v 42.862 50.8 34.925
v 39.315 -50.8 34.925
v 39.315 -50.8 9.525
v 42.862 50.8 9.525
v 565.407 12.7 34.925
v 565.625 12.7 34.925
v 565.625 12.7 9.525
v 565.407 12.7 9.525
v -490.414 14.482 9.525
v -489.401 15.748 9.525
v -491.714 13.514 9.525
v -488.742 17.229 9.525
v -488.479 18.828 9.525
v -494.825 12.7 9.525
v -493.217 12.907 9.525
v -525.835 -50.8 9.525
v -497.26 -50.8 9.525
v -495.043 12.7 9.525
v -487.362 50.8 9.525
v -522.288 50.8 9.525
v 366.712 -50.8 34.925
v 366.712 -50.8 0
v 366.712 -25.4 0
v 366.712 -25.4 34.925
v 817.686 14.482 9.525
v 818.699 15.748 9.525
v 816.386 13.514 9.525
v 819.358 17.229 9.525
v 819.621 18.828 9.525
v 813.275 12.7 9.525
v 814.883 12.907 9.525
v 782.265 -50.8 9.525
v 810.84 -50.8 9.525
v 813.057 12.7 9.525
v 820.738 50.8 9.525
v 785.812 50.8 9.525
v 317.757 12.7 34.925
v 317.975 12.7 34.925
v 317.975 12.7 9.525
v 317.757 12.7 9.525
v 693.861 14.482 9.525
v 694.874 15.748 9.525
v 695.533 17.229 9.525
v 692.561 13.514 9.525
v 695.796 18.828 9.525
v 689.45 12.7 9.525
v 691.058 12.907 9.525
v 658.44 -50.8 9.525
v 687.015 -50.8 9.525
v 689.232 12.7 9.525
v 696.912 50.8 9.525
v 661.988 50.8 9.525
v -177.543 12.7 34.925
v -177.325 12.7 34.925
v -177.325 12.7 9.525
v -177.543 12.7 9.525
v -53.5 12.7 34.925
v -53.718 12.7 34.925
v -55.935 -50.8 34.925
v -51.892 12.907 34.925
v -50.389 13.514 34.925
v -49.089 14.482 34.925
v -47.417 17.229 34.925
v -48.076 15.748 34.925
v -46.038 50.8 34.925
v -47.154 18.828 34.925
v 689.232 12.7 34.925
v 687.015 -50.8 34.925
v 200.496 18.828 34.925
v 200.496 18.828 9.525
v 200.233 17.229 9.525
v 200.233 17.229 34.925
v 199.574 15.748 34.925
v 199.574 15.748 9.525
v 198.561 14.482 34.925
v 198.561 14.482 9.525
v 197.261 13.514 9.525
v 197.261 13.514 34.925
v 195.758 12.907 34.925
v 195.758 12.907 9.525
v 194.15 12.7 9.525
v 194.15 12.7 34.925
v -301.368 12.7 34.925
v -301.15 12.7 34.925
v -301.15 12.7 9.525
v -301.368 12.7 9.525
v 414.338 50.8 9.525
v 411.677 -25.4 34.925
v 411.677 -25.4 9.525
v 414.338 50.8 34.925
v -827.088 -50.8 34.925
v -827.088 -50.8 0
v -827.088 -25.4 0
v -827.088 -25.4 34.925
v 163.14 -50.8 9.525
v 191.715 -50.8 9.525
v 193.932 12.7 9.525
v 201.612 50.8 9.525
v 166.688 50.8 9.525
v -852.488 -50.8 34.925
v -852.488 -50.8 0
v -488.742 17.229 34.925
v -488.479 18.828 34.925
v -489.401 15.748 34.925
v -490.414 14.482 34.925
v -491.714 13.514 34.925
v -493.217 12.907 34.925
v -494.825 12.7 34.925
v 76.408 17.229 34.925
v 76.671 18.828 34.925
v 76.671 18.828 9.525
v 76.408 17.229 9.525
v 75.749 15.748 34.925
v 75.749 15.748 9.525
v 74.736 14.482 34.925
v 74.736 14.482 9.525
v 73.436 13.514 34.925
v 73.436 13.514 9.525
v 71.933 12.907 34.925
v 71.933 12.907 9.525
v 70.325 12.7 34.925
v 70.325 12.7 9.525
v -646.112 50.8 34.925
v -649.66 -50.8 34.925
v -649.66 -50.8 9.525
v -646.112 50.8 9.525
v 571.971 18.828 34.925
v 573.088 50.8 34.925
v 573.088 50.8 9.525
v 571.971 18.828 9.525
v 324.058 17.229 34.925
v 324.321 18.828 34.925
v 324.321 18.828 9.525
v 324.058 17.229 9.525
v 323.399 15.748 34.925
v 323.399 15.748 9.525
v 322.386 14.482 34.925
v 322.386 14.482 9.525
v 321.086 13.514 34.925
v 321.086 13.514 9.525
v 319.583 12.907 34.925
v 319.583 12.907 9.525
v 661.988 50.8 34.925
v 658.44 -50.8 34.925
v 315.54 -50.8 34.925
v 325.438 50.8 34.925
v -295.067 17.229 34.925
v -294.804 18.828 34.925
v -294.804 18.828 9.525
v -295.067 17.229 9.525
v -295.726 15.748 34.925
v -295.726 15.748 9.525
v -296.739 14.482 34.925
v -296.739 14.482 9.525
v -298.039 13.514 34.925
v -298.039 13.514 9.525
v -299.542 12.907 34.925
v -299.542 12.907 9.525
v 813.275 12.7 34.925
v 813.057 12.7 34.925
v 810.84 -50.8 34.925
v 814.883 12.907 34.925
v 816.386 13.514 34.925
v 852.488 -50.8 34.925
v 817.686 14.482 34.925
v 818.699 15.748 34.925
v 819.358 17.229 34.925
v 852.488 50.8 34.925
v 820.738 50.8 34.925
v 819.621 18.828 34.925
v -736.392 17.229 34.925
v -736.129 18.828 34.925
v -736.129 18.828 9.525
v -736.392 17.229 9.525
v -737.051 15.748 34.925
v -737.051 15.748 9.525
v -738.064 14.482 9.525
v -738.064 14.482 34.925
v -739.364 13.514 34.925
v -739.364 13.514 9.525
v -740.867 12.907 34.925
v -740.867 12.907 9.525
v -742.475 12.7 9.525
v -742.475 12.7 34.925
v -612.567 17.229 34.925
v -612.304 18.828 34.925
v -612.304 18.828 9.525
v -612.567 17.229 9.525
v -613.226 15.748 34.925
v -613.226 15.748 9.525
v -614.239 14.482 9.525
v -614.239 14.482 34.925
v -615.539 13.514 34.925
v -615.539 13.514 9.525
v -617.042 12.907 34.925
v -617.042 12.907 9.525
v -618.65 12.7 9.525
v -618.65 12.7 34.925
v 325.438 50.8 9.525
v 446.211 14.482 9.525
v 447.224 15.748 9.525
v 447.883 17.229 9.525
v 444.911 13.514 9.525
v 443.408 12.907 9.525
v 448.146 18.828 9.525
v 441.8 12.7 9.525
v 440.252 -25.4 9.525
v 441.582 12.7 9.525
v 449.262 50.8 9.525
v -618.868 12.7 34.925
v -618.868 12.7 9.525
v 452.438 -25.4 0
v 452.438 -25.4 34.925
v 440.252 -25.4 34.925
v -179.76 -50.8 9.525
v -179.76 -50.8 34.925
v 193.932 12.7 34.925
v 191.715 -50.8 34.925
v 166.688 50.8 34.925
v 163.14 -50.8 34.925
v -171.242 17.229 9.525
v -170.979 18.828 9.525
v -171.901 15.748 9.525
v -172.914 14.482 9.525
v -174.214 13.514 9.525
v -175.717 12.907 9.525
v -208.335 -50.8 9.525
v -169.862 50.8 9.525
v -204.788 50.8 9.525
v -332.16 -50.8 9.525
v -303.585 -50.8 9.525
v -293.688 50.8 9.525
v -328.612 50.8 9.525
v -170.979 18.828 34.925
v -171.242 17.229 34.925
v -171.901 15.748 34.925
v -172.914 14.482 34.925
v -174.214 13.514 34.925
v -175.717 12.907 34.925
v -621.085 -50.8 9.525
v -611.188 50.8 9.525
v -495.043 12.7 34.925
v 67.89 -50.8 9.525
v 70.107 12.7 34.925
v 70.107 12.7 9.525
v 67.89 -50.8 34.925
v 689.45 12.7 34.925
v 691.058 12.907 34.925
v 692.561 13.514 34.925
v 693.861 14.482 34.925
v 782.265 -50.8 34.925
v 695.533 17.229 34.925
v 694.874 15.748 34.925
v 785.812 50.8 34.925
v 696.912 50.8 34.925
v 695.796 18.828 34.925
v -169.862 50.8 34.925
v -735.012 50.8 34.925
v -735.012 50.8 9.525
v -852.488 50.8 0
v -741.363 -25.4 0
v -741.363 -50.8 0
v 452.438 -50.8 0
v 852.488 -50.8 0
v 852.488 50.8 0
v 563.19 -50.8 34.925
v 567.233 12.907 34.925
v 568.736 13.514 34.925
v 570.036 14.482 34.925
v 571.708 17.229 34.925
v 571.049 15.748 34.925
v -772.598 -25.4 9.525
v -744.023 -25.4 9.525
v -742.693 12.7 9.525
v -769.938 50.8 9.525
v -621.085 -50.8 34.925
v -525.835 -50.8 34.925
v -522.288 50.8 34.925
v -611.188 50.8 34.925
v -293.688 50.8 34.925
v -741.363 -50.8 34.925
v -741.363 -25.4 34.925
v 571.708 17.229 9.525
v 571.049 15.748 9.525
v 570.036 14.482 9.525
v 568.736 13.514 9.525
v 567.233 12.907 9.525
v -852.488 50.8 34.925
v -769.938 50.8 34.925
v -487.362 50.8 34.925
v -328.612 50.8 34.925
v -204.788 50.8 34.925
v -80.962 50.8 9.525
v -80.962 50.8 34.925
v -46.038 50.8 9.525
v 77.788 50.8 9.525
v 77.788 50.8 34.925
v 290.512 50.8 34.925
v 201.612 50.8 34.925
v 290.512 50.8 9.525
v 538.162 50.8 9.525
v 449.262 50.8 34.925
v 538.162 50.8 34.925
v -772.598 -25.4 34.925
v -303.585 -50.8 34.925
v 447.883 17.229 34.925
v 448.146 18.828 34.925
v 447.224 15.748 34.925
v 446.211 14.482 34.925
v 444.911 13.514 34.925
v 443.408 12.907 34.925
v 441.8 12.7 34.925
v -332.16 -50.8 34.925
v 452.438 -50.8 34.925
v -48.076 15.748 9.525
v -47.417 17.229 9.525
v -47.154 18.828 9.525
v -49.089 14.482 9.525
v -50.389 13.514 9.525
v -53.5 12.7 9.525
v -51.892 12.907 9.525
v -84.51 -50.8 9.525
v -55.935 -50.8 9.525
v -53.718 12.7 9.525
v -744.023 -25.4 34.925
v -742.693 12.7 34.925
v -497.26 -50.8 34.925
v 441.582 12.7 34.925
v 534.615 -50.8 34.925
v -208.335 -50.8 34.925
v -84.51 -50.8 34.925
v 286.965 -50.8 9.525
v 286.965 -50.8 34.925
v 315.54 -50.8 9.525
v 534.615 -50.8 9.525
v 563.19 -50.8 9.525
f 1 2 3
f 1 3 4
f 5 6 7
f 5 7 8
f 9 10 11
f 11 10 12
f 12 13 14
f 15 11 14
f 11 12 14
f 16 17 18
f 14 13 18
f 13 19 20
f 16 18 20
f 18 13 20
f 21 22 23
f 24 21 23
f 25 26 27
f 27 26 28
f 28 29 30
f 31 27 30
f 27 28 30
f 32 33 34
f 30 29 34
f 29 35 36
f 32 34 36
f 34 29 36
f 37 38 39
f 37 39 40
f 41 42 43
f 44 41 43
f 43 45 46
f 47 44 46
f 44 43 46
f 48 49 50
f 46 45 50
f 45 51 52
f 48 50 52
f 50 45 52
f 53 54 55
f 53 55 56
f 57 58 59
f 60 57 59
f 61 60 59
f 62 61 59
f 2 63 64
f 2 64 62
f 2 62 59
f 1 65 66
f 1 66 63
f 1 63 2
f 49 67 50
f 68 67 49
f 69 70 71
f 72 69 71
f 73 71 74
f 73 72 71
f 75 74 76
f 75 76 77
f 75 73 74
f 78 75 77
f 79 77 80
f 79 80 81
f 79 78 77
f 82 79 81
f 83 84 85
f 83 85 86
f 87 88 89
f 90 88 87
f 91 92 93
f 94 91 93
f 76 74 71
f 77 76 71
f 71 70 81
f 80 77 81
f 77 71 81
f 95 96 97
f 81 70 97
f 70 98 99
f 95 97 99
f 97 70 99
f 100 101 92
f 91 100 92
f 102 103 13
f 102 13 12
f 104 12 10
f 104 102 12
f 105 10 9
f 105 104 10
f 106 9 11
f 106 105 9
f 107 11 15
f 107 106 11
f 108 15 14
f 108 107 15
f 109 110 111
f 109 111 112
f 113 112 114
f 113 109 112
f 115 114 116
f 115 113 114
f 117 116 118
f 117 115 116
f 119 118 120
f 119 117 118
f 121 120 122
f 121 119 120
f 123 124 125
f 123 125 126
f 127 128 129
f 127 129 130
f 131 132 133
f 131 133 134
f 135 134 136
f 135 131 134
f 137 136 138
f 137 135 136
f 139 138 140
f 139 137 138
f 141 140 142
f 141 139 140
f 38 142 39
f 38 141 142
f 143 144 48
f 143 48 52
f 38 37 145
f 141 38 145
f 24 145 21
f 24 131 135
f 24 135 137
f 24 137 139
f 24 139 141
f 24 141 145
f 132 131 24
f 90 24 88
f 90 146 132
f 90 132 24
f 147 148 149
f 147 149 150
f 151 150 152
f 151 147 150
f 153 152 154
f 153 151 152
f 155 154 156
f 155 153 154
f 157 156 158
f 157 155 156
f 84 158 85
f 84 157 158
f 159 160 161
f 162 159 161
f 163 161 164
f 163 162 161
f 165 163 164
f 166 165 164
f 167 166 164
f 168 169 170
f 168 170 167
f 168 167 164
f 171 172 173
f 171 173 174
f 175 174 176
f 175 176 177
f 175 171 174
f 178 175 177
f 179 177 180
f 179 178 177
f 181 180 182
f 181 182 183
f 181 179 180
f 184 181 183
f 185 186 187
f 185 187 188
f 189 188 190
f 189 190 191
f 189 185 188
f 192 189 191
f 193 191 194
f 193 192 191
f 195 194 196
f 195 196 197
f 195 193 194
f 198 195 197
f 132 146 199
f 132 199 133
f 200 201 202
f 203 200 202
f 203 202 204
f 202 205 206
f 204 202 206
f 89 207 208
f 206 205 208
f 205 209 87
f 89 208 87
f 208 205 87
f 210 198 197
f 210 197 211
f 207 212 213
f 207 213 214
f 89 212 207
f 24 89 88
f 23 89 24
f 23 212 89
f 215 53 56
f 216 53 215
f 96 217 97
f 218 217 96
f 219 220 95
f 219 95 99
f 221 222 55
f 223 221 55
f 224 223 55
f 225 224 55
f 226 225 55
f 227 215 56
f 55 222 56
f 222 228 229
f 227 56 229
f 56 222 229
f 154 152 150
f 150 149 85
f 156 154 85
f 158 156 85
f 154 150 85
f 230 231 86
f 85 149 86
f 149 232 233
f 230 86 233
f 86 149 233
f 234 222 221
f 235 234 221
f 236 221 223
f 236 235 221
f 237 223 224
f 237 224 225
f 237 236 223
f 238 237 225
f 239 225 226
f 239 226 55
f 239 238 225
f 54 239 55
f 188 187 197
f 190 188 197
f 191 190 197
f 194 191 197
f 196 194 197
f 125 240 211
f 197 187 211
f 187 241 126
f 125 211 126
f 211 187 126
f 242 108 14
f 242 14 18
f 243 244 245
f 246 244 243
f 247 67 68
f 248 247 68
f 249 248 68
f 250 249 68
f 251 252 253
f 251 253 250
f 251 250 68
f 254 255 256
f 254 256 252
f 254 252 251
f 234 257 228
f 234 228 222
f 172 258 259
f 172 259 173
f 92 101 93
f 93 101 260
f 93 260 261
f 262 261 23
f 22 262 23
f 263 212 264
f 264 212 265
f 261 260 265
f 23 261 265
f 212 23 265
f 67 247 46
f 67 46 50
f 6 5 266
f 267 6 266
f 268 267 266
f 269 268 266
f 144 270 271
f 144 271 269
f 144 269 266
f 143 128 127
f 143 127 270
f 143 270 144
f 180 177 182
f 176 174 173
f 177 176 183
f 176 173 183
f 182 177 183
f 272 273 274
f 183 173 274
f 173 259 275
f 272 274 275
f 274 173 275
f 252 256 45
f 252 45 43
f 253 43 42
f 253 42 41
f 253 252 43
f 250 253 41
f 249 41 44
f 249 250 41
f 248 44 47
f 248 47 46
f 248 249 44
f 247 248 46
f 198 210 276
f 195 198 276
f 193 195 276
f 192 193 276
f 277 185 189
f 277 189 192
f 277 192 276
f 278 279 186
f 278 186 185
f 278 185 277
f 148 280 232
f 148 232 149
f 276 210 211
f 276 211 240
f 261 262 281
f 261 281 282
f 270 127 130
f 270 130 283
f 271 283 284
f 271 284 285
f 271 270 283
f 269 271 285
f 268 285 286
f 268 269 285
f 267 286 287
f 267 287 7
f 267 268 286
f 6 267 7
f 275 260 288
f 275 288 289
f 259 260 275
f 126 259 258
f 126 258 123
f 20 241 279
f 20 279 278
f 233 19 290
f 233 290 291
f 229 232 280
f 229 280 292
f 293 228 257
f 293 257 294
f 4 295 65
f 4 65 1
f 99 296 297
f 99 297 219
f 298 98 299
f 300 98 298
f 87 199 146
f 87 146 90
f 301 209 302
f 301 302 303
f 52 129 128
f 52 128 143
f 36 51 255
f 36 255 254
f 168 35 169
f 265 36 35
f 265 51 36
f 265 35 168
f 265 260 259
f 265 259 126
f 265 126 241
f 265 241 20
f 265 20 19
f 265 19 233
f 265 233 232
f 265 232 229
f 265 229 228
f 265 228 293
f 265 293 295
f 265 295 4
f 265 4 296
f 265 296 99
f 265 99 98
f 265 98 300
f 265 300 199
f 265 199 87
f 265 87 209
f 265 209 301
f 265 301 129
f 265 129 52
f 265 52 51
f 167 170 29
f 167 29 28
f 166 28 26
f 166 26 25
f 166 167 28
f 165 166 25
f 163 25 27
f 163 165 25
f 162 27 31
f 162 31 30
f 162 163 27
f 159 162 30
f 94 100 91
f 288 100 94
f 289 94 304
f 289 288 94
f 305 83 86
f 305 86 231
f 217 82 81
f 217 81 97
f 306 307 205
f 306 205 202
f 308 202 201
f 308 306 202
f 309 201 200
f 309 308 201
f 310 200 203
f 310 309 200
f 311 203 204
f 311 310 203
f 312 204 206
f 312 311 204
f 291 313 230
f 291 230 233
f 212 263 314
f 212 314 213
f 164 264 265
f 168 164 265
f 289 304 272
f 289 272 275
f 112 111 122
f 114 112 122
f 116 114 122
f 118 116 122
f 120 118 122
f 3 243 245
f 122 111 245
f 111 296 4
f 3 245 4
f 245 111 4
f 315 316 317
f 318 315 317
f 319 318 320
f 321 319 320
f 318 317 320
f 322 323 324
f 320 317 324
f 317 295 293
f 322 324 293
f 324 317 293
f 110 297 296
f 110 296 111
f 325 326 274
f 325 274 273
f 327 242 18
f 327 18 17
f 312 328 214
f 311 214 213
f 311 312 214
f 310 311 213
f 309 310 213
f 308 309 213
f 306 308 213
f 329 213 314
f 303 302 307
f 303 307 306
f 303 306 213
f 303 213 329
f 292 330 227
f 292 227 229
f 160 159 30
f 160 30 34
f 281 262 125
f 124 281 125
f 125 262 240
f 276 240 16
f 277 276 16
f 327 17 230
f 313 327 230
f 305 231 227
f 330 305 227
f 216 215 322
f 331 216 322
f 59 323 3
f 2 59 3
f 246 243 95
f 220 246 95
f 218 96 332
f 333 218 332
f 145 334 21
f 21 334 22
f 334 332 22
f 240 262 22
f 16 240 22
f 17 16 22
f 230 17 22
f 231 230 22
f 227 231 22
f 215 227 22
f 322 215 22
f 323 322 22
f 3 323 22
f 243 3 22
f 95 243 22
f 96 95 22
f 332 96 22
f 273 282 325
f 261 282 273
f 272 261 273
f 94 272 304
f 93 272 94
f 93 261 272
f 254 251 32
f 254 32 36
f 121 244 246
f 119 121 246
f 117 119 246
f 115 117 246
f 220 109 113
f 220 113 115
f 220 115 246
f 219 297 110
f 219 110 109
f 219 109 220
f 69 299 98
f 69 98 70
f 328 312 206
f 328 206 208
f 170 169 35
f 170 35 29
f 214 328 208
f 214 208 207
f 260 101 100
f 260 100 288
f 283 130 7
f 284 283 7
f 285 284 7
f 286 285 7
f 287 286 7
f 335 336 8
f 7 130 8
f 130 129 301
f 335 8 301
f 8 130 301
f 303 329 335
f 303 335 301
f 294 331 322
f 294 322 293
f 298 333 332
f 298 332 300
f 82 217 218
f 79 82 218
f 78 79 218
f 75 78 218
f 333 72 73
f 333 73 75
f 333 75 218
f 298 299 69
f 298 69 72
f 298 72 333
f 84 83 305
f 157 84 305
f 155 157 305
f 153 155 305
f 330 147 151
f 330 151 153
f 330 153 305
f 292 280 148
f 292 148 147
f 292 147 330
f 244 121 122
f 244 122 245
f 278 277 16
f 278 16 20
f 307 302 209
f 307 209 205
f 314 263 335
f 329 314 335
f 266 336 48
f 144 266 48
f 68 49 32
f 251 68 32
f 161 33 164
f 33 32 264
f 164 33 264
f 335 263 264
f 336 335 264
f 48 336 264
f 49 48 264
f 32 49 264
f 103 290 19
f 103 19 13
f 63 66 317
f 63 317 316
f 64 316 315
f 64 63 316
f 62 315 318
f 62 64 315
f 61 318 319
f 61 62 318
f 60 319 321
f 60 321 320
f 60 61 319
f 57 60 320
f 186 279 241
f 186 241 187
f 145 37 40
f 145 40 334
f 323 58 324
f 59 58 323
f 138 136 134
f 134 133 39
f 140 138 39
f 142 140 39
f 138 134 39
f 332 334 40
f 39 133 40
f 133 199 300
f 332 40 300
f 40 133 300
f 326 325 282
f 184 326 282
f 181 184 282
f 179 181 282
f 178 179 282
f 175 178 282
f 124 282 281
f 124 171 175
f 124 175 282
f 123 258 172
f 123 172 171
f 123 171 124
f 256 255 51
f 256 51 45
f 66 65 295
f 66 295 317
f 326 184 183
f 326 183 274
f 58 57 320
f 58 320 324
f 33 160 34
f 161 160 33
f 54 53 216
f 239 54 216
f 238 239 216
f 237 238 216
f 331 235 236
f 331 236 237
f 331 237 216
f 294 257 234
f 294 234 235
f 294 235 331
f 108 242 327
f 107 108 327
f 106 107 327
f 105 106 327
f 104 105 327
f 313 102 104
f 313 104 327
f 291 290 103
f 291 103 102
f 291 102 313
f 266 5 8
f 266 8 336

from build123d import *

# Parameters (mm, degrees)
SKETCH1_W           = 1704.975
SKETCH1_H           = 101.6
BOSS_EXTRUDE1_DEPTH = 34.925
CUT_EXTRUDE1_DEPTH  = 25.4
SKETCH3_W           = 85.725
SKETCH3_H           = 25.4
CUT_EXTRUDE2_DEPTH  = 855.713597225


with BuildPart() as part:
    # Sketch1 → Boss-Extrude1 (new body)
    with BuildSketch(Plane.XY):
        Rectangle(SKETCH1_W, SKETCH1_H)
    extrude(amount=BOSS_EXTRUDE1_DEPTH)

    # Sketch2 → Cut-Extrude1 (cut)
    with BuildSketch(Plane.XY.offset(34.925)):
        with BuildLine():
            Line((782.26454982, -50.8), (785.8125, 50.8))
            Line((785.8125, 50.8), (820.7375, 50.8))
            Line((820.7375, 50.8), (819.621026714, 18.828388196))
            ThreePointArc((819.621026714, 18.828388196), (817.685975615, 14.482192268), (813.274894962, 12.7))
            Line((813.274894962, 12.7), (813.057018682, 12.7))
            Line((813.057018682, 12.7), (810.83954982, -50.8))
            Line((810.83954982, -50.8), (782.26454982, -50.8))
        make_face()
        with BuildLine():
            Line((658.43954982, -50.8), (661.9875, 50.8))
            Line((661.9875, 50.8), (696.9125, 50.8))
            Line((696.9125, 50.8), (695.796026714, 18.828388196))
            ThreePointArc((695.796026714, 18.828388196), (693.860975615, 14.482192268), (689.449894962, 12.7))
            Line((689.449894962, 12.7), (689.232018682, 12.7))
            Line((689.232018682, 12.7), (687.01454982, -50.8))
            Line((687.01454982, -50.8), (658.43954982, -50.8))
        make_face()
        with BuildLine():
            Line((534.61454982, -50.8), (538.1625, 50.8))
            Line((538.1625, 50.8), (573.0875, 50.8))
            Line((573.0875, 50.8), (571.971026714, 18.828388196))
            ThreePointArc((571.971026714, 18.828388196), (570.035975615, 14.482192268), (565.624894962, 12.7))
            Line((565.624894962, 12.7), (565.407018682, 12.7))
            Line((565.407018682, 12.7), (563.18954982, -50.8))
            Line((563.18954982, -50.8), (534.61454982, -50.8))
        make_face()
        with BuildLine():
            Line((410.78954982, -50.8), (414.3375, 50.8))
            Line((414.3375, 50.8), (449.2625, 50.8))
            Line((449.2625, 50.8), (448.146026714, 18.828388196))
            ThreePointArc((448.146026714, 18.828388196), (446.210975615, 14.482192268), (441.799894962, 12.7))
            Line((441.799894962, 12.7), (441.582018682, 12.7))
            Line((441.582018682, 12.7), (439.36454982, -50.8))
            Line((439.36454982, -50.8), (410.78954982, -50.8))
        make_face()
        with BuildLine():
            Line((286.96454982, -50.8), (290.5125, 50.8))
            Line((290.5125, 50.8), (325.4375, 50.8))
            Line((325.4375, 50.8), (324.321026714, 18.828388196))
            ThreePointArc((324.321026714, 18.828388196), (322.385975615, 14.482192268), (317.974894962, 12.7))
            Line((317.974894962, 12.7), (317.757018682, 12.7))
            Line((317.757018682, 12.7), (315.53954982, -50.8))
            Line((315.53954982, -50.8), (286.96454982, -50.8))
        make_face()
        with BuildLine():
            Line((163.13954982, -50.8), (166.6875, 50.8))
            Line((166.6875, 50.8), (201.6125, 50.8))
            Line((201.6125, 50.8), (200.496026714, 18.828388196))
            ThreePointArc((200.496026714, 18.828388196), (198.560975615, 14.482192268), (194.149894962, 12.7))
            Line((194.149894962, 12.7), (193.932018682, 12.7))
            Line((193.932018682, 12.7), (191.71454982, -50.8))
            Line((191.71454982, -50.8), (163.13954982, -50.8))
        make_face()
        with BuildLine():
            Line((39.31454982, -50.8), (42.8625, 50.8))
            Line((42.8625, 50.8), (77.7875, 50.8))
            Line((77.7875, 50.8), (76.671026714, 18.828388196))
            ThreePointArc((76.671026714, 18.828388196), (74.735975615, 14.482192268), (70.324894962, 12.7))
            Line((70.324894962, 12.7), (70.107018682, 12.7))
            Line((70.107018682, 12.7), (67.88954982, -50.8))
            Line((67.88954982, -50.8), (39.31454982, -50.8))
        make_face()
        with BuildLine():
            Line((-84.51045018, -50.8), (-80.9625, 50.8))
            Line((-80.9625, 50.8), (-46.0375, 50.8))
            Line((-46.0375, 50.8), (-47.153973286, 18.828388196))
            ThreePointArc((-47.153973286, 18.828388196), (-49.089024385, 14.482192268), (-53.500105038, 12.7))
            Line((-53.500105038, 12.7), (-53.717981318, 12.7))
            Line((-53.717981318, 12.7), (-55.93545018, -50.8))
            Line((-55.93545018, -50.8), (-84.51045018, -50.8))
        make_face()
        with BuildLine():
            Line((-208.33545018, -50.8), (-204.7875, 50.8))
            Line((-204.7875, 50.8), (-169.8625, 50.8))
            Line((-169.8625, 50.8), (-170.978973286, 18.828388196))
            ThreePointArc((-170.978973286, 18.828388196), (-172.914024385, 14.482192268), (-177.325105038, 12.7))
            Line((-177.325105038, 12.7), (-177.542981318, 12.7))
            Line((-177.542981318, 12.7), (-179.76045018, -50.8))
            Line((-179.76045018, -50.8), (-208.33545018, -50.8))
        make_face()
        with BuildLine():
            Line((-332.16045018, -50.8), (-328.6125, 50.8))
            Line((-328.6125, 50.8), (-293.6875, 50.8))
            Line((-293.6875, 50.8), (-294.803973286, 18.828388196))
            ThreePointArc((-294.803973286, 18.828388196), (-296.739024385, 14.482192268), (-301.150105038, 12.7))
            Line((-301.150105038, 12.7), (-301.367981318, 12.7))
            Line((-301.367981318, 12.7), (-303.58545018, -50.8))
            Line((-303.58545018, -50.8), (-332.16045018, -50.8))
        make_face()
        with BuildLine():
            Line((-525.83545018, -50.8), (-522.2875, 50.8))
            Line((-522.2875, 50.8), (-487.3625, 50.8))
            Line((-487.3625, 50.8), (-488.478973286, 18.828388196))
            ThreePointArc((-488.478973286, 18.828388196), (-490.414024385, 14.482192268), (-494.825105038, 12.7))
            Line((-494.825105038, 12.7), (-495.042981318, 12.7))
            Line((-495.042981318, 12.7), (-497.26045018, -50.8))
            Line((-497.26045018, -50.8), (-525.83545018, -50.8))
        make_face()
        with BuildLine():
            Line((-649.66045018, -50.8), (-646.1125, 50.8))
            Line((-646.1125, 50.8), (-611.1875, 50.8))
            Line((-611.1875, 50.8), (-612.303973286, 18.828388196))
            ThreePointArc((-612.303973286, 18.828388196), (-614.239024385, 14.482192268), (-618.650105038, 12.7))
            Line((-618.650105038, 12.7), (-618.867981318, 12.7))
            Line((-618.867981318, 12.7), (-621.08545018, -50.8))
            Line((-621.08545018, -50.8), (-649.66045018, -50.8))
        make_face()
        with BuildLine():
            Line((-773.48545018, -50.8), (-769.9375, 50.8))
            Line((-769.9375, 50.8), (-735.0125, 50.8))
            Line((-735.0125, 50.8), (-736.128973286, 18.828388196))
            ThreePointArc((-736.128973286, 18.828388196), (-738.064024385, 14.482192268), (-742.475105038, 12.7))
            Line((-742.475105038, 12.7), (-742.692981318, 12.7))
            Line((-742.692981318, 12.7), (-744.91045018, -50.8))
            Line((-744.91045018, -50.8), (-773.48545018, -50.8))
        make_face()
    extrude(amount=-CUT_EXTRUDE1_DEPTH, mode=Mode.SUBTRACT)

    # Sketch3 → Cut-Extrude2 (cut, through all)
    with BuildSketch(Plane(origin=(0, 0, 0), x_dir=(-1, 0, 0), z_dir=(0, 0, -1))):
        with Locations((784.225, -38.1)):
            Rectangle(SKETCH3_W, SKETCH3_H)
        with Locations((-409.575, -38.1)):
            Rectangle(SKETCH3_W, SKETCH3_H)
    extrude(amount=-CUT_EXTRUDE2_DEPTH, mode=Mode.SUBTRACT)


solid = part.part
